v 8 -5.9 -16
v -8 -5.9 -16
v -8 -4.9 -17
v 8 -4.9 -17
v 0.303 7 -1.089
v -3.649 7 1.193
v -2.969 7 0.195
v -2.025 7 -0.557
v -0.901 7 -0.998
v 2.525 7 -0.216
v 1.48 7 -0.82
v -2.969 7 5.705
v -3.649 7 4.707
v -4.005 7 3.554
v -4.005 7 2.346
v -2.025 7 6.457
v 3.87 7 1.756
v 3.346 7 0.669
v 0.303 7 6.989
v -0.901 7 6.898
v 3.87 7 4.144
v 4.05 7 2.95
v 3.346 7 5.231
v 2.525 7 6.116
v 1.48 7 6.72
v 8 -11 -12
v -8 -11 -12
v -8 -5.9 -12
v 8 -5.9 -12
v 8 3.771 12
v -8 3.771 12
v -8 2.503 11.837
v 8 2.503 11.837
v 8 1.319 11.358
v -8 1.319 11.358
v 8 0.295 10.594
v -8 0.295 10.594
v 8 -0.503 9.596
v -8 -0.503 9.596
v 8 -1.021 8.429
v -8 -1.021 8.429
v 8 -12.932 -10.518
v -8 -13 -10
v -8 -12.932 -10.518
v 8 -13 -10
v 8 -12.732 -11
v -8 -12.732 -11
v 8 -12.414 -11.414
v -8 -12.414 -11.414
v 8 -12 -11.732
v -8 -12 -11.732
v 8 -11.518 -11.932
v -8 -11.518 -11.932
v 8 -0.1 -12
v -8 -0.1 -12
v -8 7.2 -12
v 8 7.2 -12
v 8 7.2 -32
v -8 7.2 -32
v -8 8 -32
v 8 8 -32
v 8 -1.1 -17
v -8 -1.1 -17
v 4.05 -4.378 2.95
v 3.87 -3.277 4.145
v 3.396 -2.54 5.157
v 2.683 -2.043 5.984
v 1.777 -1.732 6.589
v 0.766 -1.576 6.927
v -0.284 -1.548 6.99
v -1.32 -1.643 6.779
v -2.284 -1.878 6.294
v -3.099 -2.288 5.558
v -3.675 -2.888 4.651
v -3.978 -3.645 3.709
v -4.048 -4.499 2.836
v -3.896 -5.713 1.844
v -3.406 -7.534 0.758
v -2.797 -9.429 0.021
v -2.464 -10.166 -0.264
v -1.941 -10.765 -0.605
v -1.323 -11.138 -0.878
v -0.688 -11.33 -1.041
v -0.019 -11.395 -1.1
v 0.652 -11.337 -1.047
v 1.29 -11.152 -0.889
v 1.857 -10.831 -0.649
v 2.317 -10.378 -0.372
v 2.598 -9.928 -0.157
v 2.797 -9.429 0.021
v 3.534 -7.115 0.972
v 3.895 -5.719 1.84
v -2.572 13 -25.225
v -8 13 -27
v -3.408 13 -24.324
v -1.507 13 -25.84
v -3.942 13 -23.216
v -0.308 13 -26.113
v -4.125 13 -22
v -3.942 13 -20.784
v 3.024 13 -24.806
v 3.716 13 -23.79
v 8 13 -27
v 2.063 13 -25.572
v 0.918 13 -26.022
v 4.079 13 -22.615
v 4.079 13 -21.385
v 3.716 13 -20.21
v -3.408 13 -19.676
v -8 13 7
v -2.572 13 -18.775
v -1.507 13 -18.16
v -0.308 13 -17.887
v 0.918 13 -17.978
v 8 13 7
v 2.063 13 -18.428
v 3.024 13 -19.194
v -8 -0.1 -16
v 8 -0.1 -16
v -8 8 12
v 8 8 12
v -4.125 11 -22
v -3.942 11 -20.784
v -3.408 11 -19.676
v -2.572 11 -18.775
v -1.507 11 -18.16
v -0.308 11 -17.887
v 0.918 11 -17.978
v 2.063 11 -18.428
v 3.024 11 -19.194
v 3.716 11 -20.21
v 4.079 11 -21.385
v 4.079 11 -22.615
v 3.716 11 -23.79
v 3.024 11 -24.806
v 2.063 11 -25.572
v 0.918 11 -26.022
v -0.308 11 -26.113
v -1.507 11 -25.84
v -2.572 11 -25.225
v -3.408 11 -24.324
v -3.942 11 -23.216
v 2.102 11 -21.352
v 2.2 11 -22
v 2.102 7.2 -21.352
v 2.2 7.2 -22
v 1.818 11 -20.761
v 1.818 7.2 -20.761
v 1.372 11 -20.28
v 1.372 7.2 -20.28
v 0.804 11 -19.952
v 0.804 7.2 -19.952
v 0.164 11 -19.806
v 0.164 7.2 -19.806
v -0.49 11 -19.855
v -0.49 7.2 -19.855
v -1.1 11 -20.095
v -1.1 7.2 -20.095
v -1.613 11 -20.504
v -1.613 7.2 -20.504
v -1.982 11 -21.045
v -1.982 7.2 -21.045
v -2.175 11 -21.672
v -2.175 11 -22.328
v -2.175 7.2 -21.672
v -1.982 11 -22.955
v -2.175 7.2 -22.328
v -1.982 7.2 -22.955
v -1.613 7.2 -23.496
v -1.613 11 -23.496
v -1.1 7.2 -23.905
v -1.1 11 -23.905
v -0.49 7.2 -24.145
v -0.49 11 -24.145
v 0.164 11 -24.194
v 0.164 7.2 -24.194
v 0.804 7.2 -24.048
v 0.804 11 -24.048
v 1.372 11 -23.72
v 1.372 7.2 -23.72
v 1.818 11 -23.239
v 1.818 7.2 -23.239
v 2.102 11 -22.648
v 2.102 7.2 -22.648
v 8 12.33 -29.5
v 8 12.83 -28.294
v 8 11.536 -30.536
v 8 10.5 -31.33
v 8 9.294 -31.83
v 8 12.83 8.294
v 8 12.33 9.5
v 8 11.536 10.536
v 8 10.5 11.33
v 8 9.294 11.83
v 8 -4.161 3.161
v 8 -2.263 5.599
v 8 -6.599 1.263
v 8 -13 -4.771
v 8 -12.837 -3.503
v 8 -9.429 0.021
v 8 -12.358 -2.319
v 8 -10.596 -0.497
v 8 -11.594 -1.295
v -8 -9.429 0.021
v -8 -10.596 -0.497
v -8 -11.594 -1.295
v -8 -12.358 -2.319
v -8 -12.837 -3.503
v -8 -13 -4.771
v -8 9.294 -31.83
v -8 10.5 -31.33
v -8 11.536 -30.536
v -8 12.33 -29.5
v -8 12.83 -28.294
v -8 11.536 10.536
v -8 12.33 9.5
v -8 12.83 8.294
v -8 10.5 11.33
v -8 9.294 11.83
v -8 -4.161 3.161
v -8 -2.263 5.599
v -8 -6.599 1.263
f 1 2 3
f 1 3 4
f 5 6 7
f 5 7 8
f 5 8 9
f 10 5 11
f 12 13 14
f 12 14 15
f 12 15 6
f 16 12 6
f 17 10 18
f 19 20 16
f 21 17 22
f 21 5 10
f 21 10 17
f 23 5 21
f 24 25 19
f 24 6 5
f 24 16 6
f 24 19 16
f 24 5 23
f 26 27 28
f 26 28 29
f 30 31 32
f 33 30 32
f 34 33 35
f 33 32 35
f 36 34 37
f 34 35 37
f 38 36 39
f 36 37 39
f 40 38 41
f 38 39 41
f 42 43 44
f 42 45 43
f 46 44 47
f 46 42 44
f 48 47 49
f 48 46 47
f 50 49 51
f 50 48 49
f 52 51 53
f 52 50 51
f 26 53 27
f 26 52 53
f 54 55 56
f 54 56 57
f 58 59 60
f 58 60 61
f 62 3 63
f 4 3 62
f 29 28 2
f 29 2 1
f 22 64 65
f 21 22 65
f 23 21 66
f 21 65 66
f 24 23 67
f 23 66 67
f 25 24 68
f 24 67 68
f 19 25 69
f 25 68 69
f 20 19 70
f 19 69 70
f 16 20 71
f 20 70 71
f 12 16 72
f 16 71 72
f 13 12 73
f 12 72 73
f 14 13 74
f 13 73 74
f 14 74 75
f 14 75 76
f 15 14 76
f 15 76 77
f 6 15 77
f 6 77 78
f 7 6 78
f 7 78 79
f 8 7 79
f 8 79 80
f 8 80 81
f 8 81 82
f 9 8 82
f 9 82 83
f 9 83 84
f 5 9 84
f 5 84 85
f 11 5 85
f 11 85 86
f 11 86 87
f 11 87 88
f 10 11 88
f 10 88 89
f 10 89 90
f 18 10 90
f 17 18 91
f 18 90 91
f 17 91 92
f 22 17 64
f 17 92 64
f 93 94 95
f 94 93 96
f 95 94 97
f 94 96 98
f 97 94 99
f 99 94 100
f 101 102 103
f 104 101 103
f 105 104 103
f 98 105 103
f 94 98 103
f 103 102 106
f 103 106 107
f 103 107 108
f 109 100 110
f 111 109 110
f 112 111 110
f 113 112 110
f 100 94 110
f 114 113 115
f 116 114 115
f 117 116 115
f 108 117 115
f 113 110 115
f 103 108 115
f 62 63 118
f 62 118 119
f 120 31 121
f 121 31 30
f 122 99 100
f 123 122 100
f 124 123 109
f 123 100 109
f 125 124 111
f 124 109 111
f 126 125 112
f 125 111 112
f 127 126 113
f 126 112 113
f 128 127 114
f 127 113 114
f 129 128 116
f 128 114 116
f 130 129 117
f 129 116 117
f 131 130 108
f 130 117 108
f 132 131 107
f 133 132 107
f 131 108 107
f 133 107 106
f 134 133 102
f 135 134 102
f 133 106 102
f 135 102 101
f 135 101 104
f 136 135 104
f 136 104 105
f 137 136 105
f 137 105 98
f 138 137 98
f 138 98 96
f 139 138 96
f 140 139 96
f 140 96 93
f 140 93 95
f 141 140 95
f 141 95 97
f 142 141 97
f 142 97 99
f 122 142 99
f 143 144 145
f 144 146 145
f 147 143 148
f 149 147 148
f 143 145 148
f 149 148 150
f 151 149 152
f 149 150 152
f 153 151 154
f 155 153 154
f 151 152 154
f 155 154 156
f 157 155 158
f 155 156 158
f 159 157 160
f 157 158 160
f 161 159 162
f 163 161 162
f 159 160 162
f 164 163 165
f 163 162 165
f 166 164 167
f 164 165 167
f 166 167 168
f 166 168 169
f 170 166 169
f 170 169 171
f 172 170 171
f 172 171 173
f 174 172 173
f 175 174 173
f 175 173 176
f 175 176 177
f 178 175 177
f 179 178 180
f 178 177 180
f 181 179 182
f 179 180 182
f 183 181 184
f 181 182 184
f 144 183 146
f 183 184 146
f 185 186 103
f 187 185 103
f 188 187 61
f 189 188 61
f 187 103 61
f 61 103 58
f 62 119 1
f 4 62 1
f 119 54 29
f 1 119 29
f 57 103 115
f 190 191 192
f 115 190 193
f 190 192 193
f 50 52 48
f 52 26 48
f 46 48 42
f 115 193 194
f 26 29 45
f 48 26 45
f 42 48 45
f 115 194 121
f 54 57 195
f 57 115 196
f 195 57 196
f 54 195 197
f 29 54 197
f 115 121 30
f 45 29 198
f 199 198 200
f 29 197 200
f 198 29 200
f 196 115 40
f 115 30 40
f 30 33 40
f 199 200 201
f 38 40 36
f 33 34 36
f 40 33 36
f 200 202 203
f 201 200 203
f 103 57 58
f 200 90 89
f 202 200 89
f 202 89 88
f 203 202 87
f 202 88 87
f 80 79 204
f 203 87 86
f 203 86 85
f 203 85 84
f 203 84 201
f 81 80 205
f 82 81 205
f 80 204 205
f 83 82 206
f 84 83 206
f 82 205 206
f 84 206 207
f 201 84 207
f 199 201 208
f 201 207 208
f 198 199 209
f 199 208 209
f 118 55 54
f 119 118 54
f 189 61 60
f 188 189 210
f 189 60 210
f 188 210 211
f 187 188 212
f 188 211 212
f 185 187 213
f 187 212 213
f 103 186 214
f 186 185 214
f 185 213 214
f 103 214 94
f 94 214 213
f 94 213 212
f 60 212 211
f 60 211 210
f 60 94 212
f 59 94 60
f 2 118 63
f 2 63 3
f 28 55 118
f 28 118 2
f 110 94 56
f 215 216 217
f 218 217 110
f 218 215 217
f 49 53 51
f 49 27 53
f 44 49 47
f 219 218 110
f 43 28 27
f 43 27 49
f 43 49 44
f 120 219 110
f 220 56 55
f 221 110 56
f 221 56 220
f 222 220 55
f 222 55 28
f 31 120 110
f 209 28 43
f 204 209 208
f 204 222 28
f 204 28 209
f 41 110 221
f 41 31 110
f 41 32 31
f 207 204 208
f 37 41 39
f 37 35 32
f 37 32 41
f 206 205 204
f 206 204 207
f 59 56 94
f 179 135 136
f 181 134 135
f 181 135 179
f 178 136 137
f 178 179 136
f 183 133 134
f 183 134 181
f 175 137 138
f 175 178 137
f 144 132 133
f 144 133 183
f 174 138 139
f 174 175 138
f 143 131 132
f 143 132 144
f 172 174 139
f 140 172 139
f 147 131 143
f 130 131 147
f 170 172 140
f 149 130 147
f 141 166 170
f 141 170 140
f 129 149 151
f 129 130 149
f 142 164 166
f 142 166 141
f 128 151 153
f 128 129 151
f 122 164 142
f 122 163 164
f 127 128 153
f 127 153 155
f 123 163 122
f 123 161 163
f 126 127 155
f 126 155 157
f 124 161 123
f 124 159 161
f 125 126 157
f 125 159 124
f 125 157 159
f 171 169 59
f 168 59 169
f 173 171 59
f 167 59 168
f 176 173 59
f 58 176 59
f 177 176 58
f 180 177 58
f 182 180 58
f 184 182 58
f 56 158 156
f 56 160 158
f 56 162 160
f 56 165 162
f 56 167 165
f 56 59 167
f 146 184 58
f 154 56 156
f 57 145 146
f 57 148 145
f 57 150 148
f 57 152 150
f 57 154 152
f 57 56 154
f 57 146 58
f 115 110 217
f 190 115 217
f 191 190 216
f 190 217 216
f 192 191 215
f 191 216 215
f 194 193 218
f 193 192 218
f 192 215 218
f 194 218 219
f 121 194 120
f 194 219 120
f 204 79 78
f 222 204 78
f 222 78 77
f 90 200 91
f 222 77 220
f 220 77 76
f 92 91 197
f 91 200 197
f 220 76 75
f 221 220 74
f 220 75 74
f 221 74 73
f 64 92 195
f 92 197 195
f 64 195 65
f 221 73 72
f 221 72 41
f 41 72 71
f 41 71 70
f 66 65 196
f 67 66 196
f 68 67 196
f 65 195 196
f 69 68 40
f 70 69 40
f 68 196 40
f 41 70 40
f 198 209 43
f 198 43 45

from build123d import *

# Parameters (mm, degrees)
F0_W           = 16
F0_H           = 24
F1_DEPTH       = 13
F2_W           = 16
F2_H           = 5.8
F3_DEPTH       = 5
F4_DEPTH       = 20
F5_R           = 4.05
F6_DEPTH       = 20
F8_D           = 4.4
F8_CBORE_D     = 8.25
F8_CBORE_DEPTH = 2
F9_SIZE        = 1
F11_DEPTH      = 16.001
F12_T1_DEPTH   = 27.2312288127
F12_T3_DEPTH   = 27.2312288127
F12_T5_DEPTH   = 41
F12_T7_DEPTH   = 37.3525491562
F13_R          = 2


# Not quite as in the source:
# - a fillet or chamfer that OpenCascade refuses, or shapes differently, is made with other operations: its cross-section is extruded or revolved along the edge and cut away or added
# - a feature names something its author has since deleted; it is built from what else it names


with BuildPart() as f1:
    # F0 (on Front) → F1 (new body, symmetric)
    with BuildSketch(Plane.XZ):
        Rectangle(F0_W, F0_H)
    extrude(amount=F1_DEPTH, both=True)

    # F2 (on face) → F3 (join)
    with BuildSketch(Plane(origin=(0, 0, -12), x_dir=(1, 0, 0), z_dir=(0, 0, -1))):
        with Locations((0, 3)):
            Rectangle(F2_W, F2_H)
    extrude(amount=F3_DEPTH)

    # F2 (on face) → F4 (join)
    with BuildSketch(Plane(origin=(0, 0, -12), x_dir=(1, 0, 0), z_dir=(0, 0, -1))):
        with Locations((0, -10.1)):
            Rectangle(F2_W, F2_H)
    extrude(amount=F4_DEPTH)

    # F5 (on face) → F6 (cut)
    with BuildSketch(Plane.XZ.offset(13)):
        with Locations((0, 2.95)):
            Circle(F5_R)
    extrude(amount=-F6_DEPTH, mode=Mode.SUBTRACT)

    # F8 (through all)
    with Locations(Plane(origin=(0, 13, 0), x_dir=(-1, 0, 0), z_dir=(0, 1, 0))):
        with Locations((0, -22)):
            CounterBoreHole(F8_D / 2, F8_CBORE_D / 2, F8_CBORE_DEPTH)

    # F9
    f9_edges = [f1.edges().sort_by_distance(p)[0] for p in [
        (0, -5.9, -17),
        (0, -0.1, -17),
    ]]
    chamfer(f9_edges, length=F9_SIZE)

    # F10 (on face) → F11 (cut, through all)
    with BuildSketch(Plane.YZ.offset(8)):
        with BuildLine():
            Line((-13, 12), (-0.5, 12))
            ThreePointArc((-0.5, 12), (-21.8388347648, 20.8388347648), (-13, -0.5))
            Line((-13, -0.5), (-13, 12))
        make_face()
        with BuildLine():
            ThreePointArc((-13, -0.5), (-4.1611652352, 3.1611652352), (-0.5, 12))
            Line((-0.5, 12), (-13, 12))
            Line((-13, 12), (-13, -0.5))
        make_face()
    extrude(amount=-F11_DEPTH, mode=Mode.SUBTRACT)

    # F12: fillet of radius 5 on 5 edges, made by hand

    # F12_s2 → F12_t1 (cut)
    with BuildSketch(Plane.YZ.offset(-8.5549542346)):
        with BuildLine():
            ThreePointArc((-9.4285714286, 0.0210644063), (-12.0089186287, -1.7824383079), (-13, -4.7705098312))
            Line((-13, -4.7705098312), (-13, -0.5))
            ThreePointArc((-13, -0.5), (-11.1953802231, -0.369047961), (-9.4285714286, 0.0210644063))
        make_face()
    extrude(amount=F12_T1_DEPTH, mode=Mode.SUBTRACT)

    # F12_s4 → F12_t3 (cut)
    with BuildSketch(Plane.YZ.offset(-18.6762745781)):
        with BuildLine():
            ThreePointArc((-9.4285714286, 0.0210644063), (-12.0089186287, -1.7824383079), (-13, -4.7705098312))
            Line((-13, -4.7705098312), (-13, -0.5))
            ThreePointArc((-13, -0.5), (-11.1953802231, -0.369047961), (-9.4285714286, 0.0210644063))
        make_face()
    extrude(amount=F12_T3_DEPTH, mode=Mode.SUBTRACT)

    # F12_s6 → F12_t5 (cut)
    with BuildSketch(Plane.YZ.offset(-20.5)):
        with BuildLine():
            ThreePointArc((8, -32), (11.5355339059, -30.5355339059), (13, -27))
            Line((13, -27), (13, -32))
            Line((13, -32), (8, -32))
        make_face()
        with BuildLine():
            ThreePointArc((13, 7), (11.5355339059, 10.5355339059), (8, 12))
            Line((8, 12), (13, 12))
            Line((13, 12), (13, 7))
        make_face()
    extrude(amount=F12_T5_DEPTH, mode=Mode.SUBTRACT)

    # F12_s8 → F12_t7 (cut)
    with BuildSketch(Plane.YZ.offset(-18.6762745781)):
        with BuildLine():
            ThreePointArc((3.7705098312, 12), (0.7824383079, 11.0089186287), (-1.0210644063, 8.4285714286))
            ThreePointArc((-1.0210644063, 8.4285714286), (-0.630952039, 10.1953802231), (-0.5, 12))
            Line((-0.5, 12), (3.7705098312, 12))
        make_face()
    extrude(amount=F12_T7_DEPTH, mode=Mode.SUBTRACT)

    # F13
    f13_edges = [f1.edges().sort_by_distance(p)[0] for p in [
        (0, -13, -12),
    ]]
    fillet(f13_edges, radius=F13_R)


solid = f1.part
